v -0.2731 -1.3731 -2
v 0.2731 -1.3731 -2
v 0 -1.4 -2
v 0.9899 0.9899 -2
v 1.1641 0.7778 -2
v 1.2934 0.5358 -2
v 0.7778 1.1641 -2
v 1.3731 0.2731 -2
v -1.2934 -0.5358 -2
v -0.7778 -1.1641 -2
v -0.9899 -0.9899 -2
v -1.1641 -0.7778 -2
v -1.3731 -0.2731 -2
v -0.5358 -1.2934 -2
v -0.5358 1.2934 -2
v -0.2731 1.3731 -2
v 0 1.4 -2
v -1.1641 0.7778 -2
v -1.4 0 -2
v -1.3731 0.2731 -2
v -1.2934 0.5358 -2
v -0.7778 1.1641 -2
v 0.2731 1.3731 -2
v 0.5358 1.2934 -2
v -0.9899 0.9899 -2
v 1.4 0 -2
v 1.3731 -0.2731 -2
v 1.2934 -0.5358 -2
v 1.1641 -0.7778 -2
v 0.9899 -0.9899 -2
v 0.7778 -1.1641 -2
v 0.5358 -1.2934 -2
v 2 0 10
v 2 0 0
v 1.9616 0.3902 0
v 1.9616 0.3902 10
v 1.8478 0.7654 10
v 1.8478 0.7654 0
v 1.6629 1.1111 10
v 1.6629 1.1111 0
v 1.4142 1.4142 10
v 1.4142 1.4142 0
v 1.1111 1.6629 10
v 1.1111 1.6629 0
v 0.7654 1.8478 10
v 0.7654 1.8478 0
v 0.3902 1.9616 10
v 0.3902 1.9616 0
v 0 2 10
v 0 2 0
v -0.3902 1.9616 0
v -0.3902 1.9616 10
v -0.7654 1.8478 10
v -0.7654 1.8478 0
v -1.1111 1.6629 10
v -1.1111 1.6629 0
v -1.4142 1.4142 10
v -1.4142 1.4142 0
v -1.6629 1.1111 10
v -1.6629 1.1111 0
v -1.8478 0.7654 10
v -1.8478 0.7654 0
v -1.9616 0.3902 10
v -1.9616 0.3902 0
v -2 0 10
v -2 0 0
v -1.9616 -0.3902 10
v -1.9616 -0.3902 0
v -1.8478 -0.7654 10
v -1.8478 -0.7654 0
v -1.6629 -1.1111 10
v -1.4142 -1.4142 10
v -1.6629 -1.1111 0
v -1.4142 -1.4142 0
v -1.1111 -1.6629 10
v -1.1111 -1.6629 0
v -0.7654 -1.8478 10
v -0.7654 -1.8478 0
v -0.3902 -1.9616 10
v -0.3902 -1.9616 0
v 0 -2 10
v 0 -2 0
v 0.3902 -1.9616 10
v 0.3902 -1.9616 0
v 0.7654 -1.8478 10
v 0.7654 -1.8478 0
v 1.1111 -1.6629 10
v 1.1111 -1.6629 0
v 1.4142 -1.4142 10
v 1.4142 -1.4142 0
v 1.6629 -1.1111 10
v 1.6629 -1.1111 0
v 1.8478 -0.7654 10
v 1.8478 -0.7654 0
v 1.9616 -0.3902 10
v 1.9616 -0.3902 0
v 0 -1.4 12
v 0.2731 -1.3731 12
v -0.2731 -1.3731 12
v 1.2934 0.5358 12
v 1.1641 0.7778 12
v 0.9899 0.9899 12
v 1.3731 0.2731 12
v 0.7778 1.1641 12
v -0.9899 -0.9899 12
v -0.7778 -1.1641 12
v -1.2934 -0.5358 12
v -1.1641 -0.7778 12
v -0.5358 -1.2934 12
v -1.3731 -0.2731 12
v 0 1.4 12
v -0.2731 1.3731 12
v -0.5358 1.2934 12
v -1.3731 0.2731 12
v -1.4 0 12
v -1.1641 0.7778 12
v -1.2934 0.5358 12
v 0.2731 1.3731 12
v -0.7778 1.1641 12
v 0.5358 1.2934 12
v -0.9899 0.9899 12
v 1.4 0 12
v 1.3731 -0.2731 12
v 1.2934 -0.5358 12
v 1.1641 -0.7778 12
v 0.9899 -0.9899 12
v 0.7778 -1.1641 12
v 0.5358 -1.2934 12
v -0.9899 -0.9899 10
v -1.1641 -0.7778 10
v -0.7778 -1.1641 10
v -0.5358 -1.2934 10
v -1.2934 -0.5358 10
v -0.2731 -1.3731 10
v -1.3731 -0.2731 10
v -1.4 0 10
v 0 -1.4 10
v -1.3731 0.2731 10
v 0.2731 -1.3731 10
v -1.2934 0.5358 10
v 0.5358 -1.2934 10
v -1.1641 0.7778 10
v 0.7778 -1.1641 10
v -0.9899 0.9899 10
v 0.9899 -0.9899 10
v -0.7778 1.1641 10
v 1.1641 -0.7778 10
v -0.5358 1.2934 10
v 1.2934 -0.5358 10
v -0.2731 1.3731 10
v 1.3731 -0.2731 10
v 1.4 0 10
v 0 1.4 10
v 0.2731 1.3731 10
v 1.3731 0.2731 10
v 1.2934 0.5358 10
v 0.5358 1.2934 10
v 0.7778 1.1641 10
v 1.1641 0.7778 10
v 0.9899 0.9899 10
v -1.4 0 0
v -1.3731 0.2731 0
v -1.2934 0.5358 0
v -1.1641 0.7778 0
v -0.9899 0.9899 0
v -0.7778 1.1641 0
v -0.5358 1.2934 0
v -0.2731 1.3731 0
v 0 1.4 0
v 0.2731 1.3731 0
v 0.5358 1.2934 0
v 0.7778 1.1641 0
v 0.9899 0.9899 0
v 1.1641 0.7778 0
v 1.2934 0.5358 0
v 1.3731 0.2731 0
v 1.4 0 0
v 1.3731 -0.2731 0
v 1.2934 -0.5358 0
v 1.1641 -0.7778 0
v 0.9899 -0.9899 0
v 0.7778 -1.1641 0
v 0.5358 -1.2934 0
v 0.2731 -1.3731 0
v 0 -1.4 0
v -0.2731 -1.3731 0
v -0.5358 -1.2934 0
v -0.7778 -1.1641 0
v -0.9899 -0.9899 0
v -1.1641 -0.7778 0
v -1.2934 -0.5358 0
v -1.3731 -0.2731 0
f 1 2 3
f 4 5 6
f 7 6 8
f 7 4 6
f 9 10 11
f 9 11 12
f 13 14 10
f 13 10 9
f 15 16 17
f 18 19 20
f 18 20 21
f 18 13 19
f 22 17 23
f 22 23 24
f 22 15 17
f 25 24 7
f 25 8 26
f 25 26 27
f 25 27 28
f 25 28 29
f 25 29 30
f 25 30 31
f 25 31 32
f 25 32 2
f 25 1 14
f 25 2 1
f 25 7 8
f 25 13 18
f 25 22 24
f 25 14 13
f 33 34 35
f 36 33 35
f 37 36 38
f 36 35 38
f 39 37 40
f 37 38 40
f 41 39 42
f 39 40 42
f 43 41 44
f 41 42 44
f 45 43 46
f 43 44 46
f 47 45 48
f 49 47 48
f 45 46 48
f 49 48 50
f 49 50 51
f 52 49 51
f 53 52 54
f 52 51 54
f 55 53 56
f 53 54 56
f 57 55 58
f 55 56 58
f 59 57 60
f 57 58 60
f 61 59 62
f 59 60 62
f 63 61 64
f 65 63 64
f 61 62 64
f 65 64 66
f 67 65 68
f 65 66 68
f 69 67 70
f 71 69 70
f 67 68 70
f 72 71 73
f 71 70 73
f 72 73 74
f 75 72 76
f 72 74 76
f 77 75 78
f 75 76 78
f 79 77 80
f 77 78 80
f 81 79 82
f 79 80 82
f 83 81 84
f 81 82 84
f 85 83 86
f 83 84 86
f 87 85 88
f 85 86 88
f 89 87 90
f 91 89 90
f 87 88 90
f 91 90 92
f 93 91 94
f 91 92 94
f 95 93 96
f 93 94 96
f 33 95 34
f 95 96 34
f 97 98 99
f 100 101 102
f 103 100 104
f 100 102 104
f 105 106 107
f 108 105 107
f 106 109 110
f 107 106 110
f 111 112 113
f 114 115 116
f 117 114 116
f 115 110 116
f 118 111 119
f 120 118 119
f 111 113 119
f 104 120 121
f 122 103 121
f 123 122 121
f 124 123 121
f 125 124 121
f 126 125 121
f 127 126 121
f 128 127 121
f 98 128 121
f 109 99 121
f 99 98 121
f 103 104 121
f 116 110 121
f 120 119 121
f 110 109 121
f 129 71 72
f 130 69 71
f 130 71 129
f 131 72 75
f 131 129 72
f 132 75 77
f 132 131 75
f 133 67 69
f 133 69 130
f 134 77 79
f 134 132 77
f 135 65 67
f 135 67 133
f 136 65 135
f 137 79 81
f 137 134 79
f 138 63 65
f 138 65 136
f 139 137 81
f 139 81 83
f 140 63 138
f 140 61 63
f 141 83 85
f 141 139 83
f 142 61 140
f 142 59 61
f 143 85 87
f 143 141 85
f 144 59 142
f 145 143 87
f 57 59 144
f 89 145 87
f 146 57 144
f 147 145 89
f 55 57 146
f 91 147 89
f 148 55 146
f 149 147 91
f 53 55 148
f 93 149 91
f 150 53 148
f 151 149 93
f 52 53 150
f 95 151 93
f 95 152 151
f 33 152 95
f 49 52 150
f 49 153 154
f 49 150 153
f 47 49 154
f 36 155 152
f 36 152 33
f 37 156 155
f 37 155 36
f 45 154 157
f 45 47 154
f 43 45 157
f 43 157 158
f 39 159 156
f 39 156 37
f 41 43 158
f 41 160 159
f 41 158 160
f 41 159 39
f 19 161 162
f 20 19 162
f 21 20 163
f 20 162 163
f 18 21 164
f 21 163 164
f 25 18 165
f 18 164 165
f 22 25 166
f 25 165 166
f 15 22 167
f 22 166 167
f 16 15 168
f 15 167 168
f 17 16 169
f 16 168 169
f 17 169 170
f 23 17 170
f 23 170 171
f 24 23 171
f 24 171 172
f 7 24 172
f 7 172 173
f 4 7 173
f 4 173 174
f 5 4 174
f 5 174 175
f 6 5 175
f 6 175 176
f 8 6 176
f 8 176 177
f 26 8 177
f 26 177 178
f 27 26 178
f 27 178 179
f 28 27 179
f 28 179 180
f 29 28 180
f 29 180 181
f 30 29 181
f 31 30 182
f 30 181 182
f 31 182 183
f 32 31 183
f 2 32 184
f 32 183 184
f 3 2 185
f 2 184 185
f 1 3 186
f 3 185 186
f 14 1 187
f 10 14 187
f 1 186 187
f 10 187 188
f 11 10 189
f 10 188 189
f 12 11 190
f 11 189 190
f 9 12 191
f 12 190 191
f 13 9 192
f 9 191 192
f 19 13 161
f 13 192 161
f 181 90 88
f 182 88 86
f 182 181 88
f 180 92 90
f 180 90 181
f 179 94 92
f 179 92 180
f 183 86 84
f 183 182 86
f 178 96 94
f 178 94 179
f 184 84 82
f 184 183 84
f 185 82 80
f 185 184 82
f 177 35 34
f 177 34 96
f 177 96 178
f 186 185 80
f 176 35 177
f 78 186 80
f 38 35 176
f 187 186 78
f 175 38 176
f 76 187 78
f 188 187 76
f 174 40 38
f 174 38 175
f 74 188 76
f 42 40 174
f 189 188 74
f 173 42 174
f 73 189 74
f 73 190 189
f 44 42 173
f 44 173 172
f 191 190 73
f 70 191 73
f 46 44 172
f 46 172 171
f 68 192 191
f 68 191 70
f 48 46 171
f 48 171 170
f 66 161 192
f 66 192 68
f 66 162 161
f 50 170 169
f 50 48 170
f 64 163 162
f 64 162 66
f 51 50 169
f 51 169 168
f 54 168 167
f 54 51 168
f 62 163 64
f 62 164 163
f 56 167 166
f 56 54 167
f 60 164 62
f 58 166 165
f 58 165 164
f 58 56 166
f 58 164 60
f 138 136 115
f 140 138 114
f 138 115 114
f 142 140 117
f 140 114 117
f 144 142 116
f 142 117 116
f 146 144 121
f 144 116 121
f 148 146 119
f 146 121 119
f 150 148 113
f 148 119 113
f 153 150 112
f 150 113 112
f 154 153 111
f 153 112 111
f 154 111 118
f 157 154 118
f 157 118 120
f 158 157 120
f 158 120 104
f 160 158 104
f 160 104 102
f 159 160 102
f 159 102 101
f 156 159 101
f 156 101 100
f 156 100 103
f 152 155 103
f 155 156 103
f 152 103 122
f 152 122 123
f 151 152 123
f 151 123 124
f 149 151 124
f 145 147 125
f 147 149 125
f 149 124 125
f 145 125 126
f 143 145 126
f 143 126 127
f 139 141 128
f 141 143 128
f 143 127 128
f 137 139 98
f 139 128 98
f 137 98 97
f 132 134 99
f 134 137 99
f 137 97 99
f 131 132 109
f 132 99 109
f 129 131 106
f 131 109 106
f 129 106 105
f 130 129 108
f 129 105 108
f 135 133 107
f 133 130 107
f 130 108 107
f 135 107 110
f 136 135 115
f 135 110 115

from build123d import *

# Parameters (mm, degrees)
SKETCH_1_R           = 2
SKETCH_1_R_2         = 1.4
EXTRUDE_1_DEPTH      = 10
SKETCH_2_R           = 1.4
EXTRUDE_2_DEPTH      = 10
EXTRUDE_3_DEPTH      = 2
EXTRUDE_3_DEPTH_BACK = 12
SKETCH_3_R           = 1.4


with BuildPart() as part:
    # 草图1 → 凸台-拉伸1 (new body)
    with BuildSketch(Plane.XY):
        Circle(SKETCH_1_R)
        Circle(SKETCH_1_R_2, mode=Mode.SUBTRACT)
    extrude(amount=EXTRUDE_1_DEPTH)

    # 草图2 → 凸台-拉伸2 (add)
    with BuildSketch(Plane(origin=(0, 0, 0), x_dir=(-1, 0, 0), z_dir=(0, 0, -1))):
        Circle(SKETCH_2_R)
    extrude(amount=-EXTRUDE_2_DEPTH)

    # 草图3 → 凸台-拉伸3 (add, two sides: drawn at the far end of the back side and taken through both)
    with BuildSketch(Plane(origin=(0, 0, 0), x_dir=(-1, 0, 0), z_dir=(0, 0, -1)).offset(-EXTRUDE_3_DEPTH_BACK)):
        Circle(SKETCH_3_R)
    extrude(amount=EXTRUDE_3_DEPTH + EXTRUDE_3_DEPTH_BACK)


solid = part.part
